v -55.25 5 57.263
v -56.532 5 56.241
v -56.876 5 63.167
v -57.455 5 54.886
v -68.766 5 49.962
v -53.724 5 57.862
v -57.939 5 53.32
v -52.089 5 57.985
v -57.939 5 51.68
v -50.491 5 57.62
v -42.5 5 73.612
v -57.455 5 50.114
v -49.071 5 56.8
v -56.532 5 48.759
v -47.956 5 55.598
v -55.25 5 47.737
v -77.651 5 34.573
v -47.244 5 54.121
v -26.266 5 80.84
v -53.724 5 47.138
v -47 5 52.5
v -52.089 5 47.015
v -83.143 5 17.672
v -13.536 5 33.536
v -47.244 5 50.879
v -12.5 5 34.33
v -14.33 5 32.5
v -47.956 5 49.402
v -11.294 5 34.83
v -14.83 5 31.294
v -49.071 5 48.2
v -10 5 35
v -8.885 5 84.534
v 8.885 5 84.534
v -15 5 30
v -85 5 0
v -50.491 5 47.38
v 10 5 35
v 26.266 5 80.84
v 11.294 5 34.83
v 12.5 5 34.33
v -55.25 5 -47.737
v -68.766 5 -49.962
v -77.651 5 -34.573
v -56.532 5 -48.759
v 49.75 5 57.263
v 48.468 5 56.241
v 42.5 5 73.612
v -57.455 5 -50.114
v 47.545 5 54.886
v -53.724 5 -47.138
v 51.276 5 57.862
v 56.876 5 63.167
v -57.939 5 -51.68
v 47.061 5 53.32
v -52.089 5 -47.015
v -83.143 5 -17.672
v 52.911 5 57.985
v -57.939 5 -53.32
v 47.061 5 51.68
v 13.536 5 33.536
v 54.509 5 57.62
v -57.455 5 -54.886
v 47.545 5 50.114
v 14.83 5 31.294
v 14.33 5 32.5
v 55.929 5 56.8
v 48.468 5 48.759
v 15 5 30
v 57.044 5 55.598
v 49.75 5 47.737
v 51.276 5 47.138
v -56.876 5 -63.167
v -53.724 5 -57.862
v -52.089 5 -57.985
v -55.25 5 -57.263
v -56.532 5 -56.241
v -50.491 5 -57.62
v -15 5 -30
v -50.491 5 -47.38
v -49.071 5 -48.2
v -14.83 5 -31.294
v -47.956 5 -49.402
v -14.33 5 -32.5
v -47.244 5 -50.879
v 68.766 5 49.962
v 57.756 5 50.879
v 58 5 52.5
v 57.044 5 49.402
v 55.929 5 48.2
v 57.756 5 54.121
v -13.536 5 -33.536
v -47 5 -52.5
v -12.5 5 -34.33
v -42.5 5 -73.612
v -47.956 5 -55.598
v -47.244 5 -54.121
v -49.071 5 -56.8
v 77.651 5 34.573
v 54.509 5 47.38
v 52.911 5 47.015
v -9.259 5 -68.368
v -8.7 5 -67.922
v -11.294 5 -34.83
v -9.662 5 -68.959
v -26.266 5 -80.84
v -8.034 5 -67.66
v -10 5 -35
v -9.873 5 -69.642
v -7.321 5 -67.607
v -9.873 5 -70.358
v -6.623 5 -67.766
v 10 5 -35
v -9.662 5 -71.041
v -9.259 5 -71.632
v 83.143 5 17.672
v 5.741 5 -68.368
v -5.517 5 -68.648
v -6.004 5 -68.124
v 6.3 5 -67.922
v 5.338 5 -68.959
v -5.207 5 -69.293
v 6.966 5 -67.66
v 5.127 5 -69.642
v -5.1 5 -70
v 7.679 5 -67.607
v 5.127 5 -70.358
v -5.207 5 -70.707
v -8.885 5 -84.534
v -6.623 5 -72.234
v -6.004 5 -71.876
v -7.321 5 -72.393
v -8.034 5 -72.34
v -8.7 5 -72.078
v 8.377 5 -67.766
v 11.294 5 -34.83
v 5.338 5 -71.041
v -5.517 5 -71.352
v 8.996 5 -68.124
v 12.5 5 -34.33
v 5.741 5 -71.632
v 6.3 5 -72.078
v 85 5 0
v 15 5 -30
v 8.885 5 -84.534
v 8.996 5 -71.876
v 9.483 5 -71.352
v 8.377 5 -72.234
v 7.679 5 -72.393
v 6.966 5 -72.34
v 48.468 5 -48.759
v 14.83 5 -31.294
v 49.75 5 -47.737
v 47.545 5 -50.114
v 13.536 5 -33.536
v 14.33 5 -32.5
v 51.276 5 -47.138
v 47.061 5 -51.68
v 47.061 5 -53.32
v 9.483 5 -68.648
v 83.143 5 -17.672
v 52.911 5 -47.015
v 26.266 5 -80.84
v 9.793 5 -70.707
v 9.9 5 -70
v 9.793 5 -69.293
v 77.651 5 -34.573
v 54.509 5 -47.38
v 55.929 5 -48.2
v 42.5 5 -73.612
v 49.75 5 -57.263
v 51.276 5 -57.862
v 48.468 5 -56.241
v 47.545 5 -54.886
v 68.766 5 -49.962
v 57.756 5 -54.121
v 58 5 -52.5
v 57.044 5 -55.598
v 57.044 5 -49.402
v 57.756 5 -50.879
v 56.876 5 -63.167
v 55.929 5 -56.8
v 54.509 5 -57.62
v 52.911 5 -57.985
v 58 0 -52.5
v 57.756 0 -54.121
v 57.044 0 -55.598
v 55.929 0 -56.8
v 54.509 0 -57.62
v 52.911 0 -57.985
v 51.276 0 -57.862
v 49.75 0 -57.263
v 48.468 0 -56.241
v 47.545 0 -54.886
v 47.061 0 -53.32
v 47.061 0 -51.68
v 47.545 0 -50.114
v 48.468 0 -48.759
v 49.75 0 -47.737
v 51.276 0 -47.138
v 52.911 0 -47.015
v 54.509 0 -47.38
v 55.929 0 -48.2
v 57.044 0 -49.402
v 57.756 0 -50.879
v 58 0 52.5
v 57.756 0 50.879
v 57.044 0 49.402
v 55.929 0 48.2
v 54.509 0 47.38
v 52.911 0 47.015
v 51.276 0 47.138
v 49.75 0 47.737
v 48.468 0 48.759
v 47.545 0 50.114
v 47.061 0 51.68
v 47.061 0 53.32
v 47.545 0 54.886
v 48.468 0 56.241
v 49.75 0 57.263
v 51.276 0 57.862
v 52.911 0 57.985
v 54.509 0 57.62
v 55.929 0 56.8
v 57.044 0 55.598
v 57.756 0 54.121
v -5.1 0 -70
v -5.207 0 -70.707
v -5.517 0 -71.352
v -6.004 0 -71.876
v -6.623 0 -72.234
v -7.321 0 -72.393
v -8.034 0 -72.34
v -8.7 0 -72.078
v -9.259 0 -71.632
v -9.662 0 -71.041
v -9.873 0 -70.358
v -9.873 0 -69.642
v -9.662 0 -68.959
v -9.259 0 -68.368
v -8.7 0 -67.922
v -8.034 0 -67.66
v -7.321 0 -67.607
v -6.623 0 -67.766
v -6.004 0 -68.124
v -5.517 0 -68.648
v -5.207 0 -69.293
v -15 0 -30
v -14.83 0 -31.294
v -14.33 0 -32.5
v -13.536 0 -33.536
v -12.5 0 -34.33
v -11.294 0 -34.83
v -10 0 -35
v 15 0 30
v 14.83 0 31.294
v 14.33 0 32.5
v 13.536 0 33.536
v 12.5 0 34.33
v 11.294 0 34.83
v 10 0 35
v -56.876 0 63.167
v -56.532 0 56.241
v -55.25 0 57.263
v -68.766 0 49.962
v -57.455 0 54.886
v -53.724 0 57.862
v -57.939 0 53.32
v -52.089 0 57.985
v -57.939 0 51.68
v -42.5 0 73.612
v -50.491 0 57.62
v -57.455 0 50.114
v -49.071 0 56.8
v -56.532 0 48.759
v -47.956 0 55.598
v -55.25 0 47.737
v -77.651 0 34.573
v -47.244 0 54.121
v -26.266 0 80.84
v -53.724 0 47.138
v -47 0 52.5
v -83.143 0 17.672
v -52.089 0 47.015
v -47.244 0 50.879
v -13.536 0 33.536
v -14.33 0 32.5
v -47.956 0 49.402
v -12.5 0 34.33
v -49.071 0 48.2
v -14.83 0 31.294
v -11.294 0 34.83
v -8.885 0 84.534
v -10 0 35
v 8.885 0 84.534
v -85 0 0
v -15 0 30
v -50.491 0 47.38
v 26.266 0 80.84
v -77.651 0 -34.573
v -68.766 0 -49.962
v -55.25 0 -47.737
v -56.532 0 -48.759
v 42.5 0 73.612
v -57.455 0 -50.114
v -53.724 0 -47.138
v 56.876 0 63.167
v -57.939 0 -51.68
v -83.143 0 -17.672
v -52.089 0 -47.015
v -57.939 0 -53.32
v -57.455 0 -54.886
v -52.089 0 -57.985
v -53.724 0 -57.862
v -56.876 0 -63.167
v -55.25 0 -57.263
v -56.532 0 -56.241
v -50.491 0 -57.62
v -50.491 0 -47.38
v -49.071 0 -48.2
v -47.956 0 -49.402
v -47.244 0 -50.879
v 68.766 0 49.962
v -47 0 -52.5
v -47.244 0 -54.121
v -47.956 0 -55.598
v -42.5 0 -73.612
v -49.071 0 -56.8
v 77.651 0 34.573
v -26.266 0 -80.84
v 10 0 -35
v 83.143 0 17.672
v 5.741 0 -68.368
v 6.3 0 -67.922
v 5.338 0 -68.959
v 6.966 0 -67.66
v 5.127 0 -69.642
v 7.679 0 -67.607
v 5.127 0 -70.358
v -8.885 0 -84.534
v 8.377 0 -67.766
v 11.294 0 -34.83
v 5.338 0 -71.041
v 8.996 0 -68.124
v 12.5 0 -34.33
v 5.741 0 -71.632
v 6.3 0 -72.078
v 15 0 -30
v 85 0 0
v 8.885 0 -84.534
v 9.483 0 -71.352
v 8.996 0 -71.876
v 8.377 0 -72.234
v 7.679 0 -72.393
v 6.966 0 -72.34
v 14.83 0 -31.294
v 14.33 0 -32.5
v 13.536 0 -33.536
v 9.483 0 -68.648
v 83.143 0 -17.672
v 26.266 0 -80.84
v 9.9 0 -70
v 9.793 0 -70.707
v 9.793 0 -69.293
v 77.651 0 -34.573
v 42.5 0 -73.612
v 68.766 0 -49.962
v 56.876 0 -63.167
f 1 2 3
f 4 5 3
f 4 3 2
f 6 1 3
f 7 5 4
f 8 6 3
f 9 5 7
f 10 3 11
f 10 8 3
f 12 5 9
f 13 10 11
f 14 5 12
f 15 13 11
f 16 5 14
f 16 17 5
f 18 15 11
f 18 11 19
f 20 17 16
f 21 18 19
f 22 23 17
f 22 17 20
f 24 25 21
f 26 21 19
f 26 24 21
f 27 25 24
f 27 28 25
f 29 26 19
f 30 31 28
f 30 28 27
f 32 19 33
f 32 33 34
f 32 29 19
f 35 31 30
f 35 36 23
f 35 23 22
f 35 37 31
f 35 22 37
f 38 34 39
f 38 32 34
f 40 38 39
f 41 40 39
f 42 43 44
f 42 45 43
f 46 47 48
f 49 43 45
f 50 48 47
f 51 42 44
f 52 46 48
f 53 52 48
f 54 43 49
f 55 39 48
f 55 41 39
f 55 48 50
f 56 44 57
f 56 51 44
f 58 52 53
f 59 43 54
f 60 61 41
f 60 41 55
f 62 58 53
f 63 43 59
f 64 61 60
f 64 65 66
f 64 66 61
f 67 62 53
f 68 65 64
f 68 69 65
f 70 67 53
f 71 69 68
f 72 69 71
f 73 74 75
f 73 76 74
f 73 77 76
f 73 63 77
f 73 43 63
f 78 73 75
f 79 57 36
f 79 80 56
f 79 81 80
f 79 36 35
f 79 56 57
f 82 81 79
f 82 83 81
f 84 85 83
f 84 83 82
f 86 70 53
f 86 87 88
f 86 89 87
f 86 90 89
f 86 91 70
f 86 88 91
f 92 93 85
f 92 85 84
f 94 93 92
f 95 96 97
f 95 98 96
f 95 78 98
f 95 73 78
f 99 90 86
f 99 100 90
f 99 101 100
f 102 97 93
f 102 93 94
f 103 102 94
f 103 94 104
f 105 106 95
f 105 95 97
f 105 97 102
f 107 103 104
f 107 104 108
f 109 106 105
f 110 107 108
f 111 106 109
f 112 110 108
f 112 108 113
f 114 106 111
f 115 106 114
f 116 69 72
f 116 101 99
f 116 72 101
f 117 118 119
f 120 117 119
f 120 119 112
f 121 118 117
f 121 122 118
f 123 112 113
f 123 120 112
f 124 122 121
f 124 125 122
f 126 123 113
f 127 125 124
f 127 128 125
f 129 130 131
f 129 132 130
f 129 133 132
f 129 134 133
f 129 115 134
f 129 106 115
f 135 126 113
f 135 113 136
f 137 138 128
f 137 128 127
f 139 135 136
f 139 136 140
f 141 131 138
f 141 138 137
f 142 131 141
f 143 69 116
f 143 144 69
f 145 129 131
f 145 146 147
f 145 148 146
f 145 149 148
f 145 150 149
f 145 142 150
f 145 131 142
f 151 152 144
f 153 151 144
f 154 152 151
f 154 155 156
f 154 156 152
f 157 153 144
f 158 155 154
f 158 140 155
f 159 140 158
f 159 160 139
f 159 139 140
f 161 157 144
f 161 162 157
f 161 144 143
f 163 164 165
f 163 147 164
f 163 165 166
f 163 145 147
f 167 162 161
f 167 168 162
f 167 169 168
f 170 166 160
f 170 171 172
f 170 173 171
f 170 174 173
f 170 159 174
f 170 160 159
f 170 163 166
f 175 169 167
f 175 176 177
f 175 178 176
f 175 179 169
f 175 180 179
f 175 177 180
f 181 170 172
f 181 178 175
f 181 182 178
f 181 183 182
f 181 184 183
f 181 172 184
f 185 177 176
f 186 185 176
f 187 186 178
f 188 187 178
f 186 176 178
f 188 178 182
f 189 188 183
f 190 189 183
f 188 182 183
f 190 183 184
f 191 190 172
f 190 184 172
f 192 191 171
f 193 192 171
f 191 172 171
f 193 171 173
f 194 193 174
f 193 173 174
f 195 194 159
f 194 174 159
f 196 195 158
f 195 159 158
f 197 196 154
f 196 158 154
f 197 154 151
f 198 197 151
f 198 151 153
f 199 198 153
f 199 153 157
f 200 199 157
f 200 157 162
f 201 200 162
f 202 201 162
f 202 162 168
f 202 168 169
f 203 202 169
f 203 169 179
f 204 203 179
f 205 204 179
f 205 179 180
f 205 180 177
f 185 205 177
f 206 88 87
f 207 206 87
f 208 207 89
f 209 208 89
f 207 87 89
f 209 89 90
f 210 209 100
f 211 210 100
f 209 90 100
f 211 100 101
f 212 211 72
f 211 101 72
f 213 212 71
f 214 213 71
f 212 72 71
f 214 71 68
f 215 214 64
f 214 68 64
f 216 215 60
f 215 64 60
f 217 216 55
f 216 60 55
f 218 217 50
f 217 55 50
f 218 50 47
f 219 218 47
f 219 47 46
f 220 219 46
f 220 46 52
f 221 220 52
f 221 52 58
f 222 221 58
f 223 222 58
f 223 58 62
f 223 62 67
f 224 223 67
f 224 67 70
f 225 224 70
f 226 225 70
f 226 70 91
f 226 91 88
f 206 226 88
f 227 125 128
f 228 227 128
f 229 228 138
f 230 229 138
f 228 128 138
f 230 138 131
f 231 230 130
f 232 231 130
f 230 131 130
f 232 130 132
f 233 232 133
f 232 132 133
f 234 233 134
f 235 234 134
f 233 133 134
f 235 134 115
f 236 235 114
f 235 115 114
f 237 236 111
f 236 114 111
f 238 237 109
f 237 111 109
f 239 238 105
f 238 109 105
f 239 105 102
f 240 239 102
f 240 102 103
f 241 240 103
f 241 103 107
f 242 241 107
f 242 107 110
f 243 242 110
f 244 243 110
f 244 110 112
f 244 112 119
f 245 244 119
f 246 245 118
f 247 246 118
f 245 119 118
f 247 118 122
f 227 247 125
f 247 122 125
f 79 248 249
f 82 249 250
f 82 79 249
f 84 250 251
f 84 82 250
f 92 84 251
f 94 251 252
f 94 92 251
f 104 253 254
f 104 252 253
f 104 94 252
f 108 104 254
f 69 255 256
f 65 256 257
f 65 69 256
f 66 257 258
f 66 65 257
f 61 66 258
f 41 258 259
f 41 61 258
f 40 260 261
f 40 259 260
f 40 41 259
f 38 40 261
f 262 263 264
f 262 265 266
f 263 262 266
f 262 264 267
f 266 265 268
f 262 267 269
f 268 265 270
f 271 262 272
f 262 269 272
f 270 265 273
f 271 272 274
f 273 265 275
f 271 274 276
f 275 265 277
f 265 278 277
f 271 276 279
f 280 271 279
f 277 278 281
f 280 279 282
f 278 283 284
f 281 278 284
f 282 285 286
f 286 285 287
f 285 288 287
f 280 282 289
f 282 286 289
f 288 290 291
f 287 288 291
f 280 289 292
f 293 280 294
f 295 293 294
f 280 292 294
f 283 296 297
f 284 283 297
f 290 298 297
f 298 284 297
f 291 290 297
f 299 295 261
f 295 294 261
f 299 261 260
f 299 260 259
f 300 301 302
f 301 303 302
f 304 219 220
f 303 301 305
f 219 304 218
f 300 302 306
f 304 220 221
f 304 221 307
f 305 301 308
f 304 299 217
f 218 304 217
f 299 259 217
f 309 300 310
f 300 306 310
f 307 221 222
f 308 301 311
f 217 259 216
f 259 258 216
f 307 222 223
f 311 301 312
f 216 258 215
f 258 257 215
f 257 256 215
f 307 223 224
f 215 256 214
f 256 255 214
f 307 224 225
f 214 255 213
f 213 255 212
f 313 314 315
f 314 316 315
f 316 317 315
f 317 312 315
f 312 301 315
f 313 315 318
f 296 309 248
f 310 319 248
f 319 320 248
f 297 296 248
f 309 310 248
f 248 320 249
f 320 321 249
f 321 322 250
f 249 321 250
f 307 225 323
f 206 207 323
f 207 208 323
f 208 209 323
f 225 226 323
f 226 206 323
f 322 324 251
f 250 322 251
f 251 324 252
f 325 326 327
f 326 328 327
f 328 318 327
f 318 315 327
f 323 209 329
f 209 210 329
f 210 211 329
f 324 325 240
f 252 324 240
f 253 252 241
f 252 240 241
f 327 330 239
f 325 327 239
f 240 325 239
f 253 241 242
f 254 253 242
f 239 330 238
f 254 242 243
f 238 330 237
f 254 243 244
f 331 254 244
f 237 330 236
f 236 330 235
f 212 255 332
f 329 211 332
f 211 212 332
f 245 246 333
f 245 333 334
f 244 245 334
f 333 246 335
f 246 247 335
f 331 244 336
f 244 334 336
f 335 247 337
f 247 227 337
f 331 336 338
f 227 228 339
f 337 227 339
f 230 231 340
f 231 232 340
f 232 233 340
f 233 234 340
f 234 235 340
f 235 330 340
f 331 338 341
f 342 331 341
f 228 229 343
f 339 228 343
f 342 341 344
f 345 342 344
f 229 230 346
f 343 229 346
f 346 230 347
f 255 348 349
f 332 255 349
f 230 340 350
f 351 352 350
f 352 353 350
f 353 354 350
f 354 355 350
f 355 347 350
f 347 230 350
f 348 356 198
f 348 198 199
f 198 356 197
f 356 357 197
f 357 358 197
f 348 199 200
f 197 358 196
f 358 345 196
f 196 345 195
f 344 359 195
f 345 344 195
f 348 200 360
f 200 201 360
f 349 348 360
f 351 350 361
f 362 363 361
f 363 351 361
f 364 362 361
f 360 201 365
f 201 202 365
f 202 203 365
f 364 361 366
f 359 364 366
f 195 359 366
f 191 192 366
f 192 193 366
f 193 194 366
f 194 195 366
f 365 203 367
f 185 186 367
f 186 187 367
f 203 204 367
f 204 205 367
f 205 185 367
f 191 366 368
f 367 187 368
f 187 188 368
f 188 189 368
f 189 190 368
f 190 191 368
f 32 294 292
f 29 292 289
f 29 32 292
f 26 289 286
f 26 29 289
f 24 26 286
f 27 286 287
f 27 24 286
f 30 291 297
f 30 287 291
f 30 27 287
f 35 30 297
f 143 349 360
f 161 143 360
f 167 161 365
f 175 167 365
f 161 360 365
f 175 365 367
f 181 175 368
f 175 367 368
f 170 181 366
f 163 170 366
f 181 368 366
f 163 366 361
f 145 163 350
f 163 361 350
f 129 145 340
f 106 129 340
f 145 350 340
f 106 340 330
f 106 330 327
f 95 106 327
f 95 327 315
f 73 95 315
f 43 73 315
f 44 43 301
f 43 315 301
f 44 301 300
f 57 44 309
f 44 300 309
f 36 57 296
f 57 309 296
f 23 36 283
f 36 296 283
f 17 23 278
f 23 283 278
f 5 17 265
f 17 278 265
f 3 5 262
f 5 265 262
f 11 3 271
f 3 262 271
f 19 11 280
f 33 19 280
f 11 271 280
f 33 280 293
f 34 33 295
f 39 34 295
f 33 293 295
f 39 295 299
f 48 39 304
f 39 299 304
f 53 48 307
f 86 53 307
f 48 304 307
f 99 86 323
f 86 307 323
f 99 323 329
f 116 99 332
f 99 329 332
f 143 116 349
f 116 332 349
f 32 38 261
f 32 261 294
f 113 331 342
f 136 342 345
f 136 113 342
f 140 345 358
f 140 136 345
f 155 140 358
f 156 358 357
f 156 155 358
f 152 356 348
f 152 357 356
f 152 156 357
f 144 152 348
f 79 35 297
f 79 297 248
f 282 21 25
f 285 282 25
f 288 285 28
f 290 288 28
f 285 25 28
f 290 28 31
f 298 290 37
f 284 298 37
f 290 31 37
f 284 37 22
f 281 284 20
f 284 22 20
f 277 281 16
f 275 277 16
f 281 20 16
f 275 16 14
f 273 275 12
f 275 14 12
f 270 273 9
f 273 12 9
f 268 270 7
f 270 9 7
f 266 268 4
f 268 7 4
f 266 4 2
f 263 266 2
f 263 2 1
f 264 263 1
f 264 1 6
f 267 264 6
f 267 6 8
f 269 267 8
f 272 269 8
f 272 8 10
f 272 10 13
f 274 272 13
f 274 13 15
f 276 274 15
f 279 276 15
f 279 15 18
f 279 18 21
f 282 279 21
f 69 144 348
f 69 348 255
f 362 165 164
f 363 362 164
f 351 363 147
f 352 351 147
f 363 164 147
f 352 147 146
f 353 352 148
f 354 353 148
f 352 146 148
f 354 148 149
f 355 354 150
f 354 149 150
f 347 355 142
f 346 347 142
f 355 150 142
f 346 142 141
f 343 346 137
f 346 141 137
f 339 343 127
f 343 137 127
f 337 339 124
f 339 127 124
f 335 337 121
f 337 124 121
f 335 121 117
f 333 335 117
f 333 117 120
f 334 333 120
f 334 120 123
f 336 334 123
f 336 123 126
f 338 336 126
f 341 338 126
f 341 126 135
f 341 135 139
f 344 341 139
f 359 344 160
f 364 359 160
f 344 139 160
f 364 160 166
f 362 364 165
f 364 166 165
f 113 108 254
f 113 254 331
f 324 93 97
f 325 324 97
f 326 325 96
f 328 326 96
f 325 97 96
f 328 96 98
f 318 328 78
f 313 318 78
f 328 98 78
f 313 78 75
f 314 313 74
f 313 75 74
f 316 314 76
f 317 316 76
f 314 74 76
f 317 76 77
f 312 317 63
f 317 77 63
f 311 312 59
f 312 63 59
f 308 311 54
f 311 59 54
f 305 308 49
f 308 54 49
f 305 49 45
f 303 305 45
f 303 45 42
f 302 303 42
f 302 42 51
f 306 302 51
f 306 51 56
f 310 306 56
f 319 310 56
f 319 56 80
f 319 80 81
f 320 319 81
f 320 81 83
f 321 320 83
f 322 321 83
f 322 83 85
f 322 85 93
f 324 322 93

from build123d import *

# Parameters (mm, degrees)
SKETCH1_R          = 85
BASE_DEPTH         = 5
BOLT_HOLES_REACH   = 7
SKETCH2_R          = 5.5
SLOT_REACH         = 7
SKETCH5_R          = 2.4
SWITCH_HOLES_DEPTH = 5


with BuildPart() as part:
    # Sketch1 → Base (new body)
    with BuildSketch(Plane(origin=(0, 0, 0), x_dir=(1, 0, 0), z_dir=(0, 1, 0))):
        Circle(SKETCH1_R)
    extrude(amount=BASE_DEPTH)

    # Sketch2 → Bolt Holes (cut, up to next)
    with BuildSketch(Plane(origin=(0, 5, 0), x_dir=(1, 0, 0), z_dir=(0, 1, 0)), mode=Mode.PRIVATE) as bolt_holes_sk1:
        with Locations((52.5, 52.5)):
            Circle(SKETCH2_R)
    bolt_holes_tool1 = extrude(bolt_holes_sk1.sketch, amount=-BOLT_HOLES_REACH, mode=Mode.PRIVATE) & part.part
    add(bolt_holes_tool1.solids().sort_by_distance((52.5, 5, -52.5))[0], mode=Mode.SUBTRACT)
    # Sketch2 → Bolt Holes (cut, up to next)
    with BuildSketch(Plane(origin=(0, 5, 0), x_dir=(1, 0, 0), z_dir=(0, 1, 0)), mode=Mode.PRIVATE) as bolt_holes_sk2:
        with Locations((-52.5, 52.5)):
            Circle(SKETCH2_R)
    bolt_holes_tool2 = extrude(bolt_holes_sk2.sketch, amount=-BOLT_HOLES_REACH, mode=Mode.PRIVATE) & part.part
    add(bolt_holes_tool2.solids().sort_by_distance((-52.5, 5, -52.5))[0], mode=Mode.SUBTRACT)
    # Sketch2 → Bolt Holes (cut, up to next)
    with BuildSketch(Plane(origin=(0, 5, 0), x_dir=(1, 0, 0), z_dir=(0, 1, 0)), mode=Mode.PRIVATE) as bolt_holes_sk3:
        with Locations((52.5, -52.5)):
            Circle(SKETCH2_R)
    bolt_holes_tool3 = extrude(bolt_holes_sk3.sketch, amount=-BOLT_HOLES_REACH, mode=Mode.PRIVATE) & part.part
    add(bolt_holes_tool3.solids().sort_by_distance((52.5, 5, 52.5))[0], mode=Mode.SUBTRACT)
    # Sketch2 → Bolt Holes (cut, up to next)
    with BuildSketch(Plane(origin=(0, 5, 0), x_dir=(1, 0, 0), z_dir=(0, 1, 0)), mode=Mode.PRIVATE) as bolt_holes_sk4:
        with Locations((-52.5, -52.5)):
            Circle(SKETCH2_R)
    bolt_holes_tool4 = extrude(bolt_holes_sk4.sketch, amount=-BOLT_HOLES_REACH, mode=Mode.PRIVATE) & part.part
    add(bolt_holes_tool4.solids().sort_by_distance((-52.5, 5, 52.5))[0], mode=Mode.SUBTRACT)

    # Sketch4 → Slot (cut, up to next)
    with BuildSketch(Plane(origin=(0, 5, 0), x_dir=(1, 0, 0), z_dir=(0, 1, 0)), mode=Mode.PRIVATE) as slot_sk1:
        with BuildLine():
            Line((10, -35), (-10, -35))
            ThreePointArc((-10, -35), (-13.535533906, -33.535533906), (-15, -30))
            Line((-15, -30), (-15, 30))
            ThreePointArc((-15, 30), (-13.535533906, 33.535533906), (-10, 35))
            Line((-10, 35), (10, 35))
            ThreePointArc((10, 35), (13.535533906, 33.535533906), (15, 30))
            Line((15, 30), (15, -30))
            ThreePointArc((15, -30), (13.535533906, -33.535533906), (10, -35))
        make_face()
    slot_tool1 = extrude(slot_sk1.sketch, amount=-SLOT_REACH, mode=Mode.PRIVATE) & part.part
    add(slot_tool1.solids().sort_by_distance((0, 5, 0))[0], mode=Mode.SUBTRACT)

    # Sketch5 → Switch Holes (cut)
    with BuildSketch(Plane(origin=(0, 5, 0), x_dir=(1, 0, 0), z_dir=(0, 1, 0))):
        with Locations((7.5, 70)):
            Circle(SKETCH5_R)
        with Locations((-7.5, 70)):
            Circle(SKETCH5_R)
    extrude(amount=-SWITCH_HOLES_DEPTH, mode=Mode.SUBTRACT)


solid = part.part
